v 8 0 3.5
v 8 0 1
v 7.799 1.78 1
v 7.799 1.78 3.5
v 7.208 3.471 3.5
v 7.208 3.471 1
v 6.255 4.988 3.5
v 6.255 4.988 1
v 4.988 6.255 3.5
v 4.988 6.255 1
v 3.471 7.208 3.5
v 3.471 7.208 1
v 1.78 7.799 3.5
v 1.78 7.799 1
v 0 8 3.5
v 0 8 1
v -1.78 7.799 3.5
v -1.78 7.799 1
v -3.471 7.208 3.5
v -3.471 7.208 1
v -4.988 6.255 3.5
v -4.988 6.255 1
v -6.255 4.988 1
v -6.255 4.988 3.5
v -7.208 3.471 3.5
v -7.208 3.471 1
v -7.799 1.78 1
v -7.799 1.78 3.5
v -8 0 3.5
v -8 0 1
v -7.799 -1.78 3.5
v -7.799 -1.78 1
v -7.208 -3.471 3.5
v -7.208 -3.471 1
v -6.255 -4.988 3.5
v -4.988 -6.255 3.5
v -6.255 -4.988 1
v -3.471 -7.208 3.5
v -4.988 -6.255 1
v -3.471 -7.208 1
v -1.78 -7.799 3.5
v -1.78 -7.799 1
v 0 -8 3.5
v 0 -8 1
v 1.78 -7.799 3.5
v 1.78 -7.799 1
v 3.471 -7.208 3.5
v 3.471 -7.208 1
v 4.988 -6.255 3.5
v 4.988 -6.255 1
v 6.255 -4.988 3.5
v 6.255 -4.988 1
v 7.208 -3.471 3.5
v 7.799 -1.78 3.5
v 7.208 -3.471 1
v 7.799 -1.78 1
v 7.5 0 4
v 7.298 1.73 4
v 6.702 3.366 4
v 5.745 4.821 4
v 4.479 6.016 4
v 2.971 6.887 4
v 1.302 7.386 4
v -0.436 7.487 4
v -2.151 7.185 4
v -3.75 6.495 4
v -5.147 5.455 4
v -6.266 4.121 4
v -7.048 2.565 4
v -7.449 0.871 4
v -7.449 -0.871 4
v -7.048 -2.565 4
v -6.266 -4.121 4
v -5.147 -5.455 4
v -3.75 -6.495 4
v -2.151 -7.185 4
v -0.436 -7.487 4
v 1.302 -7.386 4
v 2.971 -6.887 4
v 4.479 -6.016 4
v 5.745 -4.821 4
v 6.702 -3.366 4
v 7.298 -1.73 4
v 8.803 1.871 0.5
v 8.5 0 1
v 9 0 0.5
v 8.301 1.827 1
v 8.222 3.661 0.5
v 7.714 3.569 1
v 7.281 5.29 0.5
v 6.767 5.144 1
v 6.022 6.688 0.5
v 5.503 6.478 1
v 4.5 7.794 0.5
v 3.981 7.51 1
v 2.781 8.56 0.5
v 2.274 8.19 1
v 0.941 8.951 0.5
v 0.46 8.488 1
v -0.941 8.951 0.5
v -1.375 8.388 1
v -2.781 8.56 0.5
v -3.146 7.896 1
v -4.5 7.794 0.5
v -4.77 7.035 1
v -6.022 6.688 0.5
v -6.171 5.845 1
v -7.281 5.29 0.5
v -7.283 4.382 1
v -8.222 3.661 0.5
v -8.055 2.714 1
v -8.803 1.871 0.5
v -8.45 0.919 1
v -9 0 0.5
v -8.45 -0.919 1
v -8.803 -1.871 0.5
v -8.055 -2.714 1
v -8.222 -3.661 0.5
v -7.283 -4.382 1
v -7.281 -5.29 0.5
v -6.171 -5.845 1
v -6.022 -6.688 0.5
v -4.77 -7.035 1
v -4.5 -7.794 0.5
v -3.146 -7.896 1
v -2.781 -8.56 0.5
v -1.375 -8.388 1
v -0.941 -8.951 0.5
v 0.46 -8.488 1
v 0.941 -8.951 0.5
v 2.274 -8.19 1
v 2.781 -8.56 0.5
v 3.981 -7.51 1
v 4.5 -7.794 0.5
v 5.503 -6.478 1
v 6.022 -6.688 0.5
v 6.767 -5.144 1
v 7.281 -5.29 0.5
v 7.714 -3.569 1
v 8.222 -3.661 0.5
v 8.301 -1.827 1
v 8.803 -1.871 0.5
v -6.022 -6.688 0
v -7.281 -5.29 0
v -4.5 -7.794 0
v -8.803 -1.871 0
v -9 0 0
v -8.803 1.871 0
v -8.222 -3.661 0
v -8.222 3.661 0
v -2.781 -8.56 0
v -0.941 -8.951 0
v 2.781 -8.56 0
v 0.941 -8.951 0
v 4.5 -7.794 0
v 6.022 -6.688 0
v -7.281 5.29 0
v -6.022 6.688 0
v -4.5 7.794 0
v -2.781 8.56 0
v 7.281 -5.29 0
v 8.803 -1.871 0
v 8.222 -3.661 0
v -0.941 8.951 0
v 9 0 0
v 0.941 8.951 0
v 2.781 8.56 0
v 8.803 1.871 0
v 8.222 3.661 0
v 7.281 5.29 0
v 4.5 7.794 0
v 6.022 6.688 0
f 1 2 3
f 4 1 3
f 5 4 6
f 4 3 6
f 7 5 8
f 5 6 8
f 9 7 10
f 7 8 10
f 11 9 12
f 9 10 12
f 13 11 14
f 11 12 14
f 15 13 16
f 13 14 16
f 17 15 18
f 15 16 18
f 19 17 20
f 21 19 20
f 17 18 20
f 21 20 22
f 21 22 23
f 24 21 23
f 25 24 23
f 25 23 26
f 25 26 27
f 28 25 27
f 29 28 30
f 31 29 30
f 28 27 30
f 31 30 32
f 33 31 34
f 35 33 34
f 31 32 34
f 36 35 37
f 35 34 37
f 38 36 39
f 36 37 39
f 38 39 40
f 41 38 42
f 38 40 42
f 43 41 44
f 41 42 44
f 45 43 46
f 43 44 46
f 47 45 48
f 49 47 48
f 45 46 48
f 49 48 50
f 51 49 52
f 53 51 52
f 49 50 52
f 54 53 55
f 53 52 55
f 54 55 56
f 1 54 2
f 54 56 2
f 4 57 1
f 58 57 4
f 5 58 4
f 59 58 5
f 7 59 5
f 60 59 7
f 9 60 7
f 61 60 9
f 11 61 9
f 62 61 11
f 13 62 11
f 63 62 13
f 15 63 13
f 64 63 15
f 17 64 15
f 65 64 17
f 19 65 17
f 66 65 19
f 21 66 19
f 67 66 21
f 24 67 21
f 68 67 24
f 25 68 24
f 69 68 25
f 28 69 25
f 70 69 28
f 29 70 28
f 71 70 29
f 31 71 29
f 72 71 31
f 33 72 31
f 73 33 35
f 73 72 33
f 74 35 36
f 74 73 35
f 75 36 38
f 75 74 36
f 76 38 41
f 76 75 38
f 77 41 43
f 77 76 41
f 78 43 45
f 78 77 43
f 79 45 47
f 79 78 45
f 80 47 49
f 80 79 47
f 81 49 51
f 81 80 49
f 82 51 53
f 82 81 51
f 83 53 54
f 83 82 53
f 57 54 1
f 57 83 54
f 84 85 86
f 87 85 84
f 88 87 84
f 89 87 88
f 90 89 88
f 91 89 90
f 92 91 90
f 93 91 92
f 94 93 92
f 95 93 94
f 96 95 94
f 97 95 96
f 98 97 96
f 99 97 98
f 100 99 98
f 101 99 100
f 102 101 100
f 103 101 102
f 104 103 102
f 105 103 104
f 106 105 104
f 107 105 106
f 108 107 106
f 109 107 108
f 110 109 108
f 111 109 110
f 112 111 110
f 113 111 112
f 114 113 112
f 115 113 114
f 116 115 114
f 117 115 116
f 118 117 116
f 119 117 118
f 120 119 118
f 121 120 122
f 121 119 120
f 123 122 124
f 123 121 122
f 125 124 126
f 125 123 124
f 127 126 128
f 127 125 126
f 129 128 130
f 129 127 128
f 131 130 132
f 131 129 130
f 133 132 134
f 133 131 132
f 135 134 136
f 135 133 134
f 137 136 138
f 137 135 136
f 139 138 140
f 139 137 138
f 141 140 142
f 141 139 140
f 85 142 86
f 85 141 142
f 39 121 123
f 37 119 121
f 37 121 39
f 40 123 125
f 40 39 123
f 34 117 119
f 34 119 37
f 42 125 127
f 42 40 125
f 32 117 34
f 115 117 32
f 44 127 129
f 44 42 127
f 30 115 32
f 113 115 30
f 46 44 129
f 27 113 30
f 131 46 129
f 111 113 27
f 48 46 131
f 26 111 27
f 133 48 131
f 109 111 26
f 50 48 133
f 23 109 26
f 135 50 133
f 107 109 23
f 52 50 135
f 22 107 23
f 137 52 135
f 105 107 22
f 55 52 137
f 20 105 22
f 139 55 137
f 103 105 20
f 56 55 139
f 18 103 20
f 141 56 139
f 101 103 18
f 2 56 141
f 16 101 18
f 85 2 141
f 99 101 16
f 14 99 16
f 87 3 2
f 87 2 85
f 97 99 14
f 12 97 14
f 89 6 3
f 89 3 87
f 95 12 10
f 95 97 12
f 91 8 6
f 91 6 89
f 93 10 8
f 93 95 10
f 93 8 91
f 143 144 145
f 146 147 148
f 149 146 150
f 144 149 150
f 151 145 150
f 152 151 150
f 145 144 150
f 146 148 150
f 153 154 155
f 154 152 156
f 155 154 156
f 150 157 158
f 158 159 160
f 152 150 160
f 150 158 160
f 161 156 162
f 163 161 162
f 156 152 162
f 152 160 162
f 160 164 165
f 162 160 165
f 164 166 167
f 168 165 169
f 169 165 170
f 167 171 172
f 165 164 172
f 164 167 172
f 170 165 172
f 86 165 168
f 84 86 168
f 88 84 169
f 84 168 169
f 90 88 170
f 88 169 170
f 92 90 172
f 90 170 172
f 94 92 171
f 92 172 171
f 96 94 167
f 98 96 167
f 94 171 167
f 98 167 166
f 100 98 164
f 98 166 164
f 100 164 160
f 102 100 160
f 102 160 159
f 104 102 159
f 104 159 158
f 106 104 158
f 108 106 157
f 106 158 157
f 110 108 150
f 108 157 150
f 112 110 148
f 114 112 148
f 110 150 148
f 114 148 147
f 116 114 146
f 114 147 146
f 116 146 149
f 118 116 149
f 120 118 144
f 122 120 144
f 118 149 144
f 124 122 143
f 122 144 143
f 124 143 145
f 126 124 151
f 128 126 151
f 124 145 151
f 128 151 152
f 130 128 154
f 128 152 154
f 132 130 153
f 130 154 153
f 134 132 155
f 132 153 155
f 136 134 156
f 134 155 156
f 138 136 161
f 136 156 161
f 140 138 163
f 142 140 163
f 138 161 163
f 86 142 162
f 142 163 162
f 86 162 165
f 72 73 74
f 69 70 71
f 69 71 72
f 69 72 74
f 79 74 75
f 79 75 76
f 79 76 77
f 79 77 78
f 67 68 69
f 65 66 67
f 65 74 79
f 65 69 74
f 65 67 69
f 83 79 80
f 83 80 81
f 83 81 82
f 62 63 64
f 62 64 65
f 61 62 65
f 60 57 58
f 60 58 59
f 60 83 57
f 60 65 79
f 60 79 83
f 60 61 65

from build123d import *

# Parameters (mm, degrees)
ESQUISSE1_R        = 9
BOSS_EXTRU_1_DEPTH = 1
CHANFREIN1_SIZE    = 0.5
ESQUISSE2_R        = 8
BOSS_EXTRU_2_DEPTH = 3
CHANFREIN2_SIZE    = 0.5


with BuildPart() as part:
    # Esquisse1 → Boss.-Extru.1 (new body)
    with BuildSketch(Plane.XY):
        Circle(ESQUISSE1_R)
    extrude(amount=BOSS_EXTRU_1_DEPTH)

    # Chanfrein1
    chanfrein1_edges = [part.edges().sort_by_distance(p)[0] for p in [
        (-9, 0, 1),
    ]]
    chamfer(chanfrein1_edges, length=CHANFREIN1_SIZE)

    # Esquisse2 → Boss.-Extru.2 (add)
    with BuildSketch(Plane.XY.offset(1)):
        Circle(ESQUISSE2_R)
    extrude(amount=BOSS_EXTRU_2_DEPTH)

    # Chanfrein2
    chanfrein2_edges = [part.edges().sort_by_distance(p)[0] for p in [
        (-8, 0, 4),
    ]]
    chamfer(chanfrein2_edges, length=CHANFREIN2_SIZE)


solid = part.part
